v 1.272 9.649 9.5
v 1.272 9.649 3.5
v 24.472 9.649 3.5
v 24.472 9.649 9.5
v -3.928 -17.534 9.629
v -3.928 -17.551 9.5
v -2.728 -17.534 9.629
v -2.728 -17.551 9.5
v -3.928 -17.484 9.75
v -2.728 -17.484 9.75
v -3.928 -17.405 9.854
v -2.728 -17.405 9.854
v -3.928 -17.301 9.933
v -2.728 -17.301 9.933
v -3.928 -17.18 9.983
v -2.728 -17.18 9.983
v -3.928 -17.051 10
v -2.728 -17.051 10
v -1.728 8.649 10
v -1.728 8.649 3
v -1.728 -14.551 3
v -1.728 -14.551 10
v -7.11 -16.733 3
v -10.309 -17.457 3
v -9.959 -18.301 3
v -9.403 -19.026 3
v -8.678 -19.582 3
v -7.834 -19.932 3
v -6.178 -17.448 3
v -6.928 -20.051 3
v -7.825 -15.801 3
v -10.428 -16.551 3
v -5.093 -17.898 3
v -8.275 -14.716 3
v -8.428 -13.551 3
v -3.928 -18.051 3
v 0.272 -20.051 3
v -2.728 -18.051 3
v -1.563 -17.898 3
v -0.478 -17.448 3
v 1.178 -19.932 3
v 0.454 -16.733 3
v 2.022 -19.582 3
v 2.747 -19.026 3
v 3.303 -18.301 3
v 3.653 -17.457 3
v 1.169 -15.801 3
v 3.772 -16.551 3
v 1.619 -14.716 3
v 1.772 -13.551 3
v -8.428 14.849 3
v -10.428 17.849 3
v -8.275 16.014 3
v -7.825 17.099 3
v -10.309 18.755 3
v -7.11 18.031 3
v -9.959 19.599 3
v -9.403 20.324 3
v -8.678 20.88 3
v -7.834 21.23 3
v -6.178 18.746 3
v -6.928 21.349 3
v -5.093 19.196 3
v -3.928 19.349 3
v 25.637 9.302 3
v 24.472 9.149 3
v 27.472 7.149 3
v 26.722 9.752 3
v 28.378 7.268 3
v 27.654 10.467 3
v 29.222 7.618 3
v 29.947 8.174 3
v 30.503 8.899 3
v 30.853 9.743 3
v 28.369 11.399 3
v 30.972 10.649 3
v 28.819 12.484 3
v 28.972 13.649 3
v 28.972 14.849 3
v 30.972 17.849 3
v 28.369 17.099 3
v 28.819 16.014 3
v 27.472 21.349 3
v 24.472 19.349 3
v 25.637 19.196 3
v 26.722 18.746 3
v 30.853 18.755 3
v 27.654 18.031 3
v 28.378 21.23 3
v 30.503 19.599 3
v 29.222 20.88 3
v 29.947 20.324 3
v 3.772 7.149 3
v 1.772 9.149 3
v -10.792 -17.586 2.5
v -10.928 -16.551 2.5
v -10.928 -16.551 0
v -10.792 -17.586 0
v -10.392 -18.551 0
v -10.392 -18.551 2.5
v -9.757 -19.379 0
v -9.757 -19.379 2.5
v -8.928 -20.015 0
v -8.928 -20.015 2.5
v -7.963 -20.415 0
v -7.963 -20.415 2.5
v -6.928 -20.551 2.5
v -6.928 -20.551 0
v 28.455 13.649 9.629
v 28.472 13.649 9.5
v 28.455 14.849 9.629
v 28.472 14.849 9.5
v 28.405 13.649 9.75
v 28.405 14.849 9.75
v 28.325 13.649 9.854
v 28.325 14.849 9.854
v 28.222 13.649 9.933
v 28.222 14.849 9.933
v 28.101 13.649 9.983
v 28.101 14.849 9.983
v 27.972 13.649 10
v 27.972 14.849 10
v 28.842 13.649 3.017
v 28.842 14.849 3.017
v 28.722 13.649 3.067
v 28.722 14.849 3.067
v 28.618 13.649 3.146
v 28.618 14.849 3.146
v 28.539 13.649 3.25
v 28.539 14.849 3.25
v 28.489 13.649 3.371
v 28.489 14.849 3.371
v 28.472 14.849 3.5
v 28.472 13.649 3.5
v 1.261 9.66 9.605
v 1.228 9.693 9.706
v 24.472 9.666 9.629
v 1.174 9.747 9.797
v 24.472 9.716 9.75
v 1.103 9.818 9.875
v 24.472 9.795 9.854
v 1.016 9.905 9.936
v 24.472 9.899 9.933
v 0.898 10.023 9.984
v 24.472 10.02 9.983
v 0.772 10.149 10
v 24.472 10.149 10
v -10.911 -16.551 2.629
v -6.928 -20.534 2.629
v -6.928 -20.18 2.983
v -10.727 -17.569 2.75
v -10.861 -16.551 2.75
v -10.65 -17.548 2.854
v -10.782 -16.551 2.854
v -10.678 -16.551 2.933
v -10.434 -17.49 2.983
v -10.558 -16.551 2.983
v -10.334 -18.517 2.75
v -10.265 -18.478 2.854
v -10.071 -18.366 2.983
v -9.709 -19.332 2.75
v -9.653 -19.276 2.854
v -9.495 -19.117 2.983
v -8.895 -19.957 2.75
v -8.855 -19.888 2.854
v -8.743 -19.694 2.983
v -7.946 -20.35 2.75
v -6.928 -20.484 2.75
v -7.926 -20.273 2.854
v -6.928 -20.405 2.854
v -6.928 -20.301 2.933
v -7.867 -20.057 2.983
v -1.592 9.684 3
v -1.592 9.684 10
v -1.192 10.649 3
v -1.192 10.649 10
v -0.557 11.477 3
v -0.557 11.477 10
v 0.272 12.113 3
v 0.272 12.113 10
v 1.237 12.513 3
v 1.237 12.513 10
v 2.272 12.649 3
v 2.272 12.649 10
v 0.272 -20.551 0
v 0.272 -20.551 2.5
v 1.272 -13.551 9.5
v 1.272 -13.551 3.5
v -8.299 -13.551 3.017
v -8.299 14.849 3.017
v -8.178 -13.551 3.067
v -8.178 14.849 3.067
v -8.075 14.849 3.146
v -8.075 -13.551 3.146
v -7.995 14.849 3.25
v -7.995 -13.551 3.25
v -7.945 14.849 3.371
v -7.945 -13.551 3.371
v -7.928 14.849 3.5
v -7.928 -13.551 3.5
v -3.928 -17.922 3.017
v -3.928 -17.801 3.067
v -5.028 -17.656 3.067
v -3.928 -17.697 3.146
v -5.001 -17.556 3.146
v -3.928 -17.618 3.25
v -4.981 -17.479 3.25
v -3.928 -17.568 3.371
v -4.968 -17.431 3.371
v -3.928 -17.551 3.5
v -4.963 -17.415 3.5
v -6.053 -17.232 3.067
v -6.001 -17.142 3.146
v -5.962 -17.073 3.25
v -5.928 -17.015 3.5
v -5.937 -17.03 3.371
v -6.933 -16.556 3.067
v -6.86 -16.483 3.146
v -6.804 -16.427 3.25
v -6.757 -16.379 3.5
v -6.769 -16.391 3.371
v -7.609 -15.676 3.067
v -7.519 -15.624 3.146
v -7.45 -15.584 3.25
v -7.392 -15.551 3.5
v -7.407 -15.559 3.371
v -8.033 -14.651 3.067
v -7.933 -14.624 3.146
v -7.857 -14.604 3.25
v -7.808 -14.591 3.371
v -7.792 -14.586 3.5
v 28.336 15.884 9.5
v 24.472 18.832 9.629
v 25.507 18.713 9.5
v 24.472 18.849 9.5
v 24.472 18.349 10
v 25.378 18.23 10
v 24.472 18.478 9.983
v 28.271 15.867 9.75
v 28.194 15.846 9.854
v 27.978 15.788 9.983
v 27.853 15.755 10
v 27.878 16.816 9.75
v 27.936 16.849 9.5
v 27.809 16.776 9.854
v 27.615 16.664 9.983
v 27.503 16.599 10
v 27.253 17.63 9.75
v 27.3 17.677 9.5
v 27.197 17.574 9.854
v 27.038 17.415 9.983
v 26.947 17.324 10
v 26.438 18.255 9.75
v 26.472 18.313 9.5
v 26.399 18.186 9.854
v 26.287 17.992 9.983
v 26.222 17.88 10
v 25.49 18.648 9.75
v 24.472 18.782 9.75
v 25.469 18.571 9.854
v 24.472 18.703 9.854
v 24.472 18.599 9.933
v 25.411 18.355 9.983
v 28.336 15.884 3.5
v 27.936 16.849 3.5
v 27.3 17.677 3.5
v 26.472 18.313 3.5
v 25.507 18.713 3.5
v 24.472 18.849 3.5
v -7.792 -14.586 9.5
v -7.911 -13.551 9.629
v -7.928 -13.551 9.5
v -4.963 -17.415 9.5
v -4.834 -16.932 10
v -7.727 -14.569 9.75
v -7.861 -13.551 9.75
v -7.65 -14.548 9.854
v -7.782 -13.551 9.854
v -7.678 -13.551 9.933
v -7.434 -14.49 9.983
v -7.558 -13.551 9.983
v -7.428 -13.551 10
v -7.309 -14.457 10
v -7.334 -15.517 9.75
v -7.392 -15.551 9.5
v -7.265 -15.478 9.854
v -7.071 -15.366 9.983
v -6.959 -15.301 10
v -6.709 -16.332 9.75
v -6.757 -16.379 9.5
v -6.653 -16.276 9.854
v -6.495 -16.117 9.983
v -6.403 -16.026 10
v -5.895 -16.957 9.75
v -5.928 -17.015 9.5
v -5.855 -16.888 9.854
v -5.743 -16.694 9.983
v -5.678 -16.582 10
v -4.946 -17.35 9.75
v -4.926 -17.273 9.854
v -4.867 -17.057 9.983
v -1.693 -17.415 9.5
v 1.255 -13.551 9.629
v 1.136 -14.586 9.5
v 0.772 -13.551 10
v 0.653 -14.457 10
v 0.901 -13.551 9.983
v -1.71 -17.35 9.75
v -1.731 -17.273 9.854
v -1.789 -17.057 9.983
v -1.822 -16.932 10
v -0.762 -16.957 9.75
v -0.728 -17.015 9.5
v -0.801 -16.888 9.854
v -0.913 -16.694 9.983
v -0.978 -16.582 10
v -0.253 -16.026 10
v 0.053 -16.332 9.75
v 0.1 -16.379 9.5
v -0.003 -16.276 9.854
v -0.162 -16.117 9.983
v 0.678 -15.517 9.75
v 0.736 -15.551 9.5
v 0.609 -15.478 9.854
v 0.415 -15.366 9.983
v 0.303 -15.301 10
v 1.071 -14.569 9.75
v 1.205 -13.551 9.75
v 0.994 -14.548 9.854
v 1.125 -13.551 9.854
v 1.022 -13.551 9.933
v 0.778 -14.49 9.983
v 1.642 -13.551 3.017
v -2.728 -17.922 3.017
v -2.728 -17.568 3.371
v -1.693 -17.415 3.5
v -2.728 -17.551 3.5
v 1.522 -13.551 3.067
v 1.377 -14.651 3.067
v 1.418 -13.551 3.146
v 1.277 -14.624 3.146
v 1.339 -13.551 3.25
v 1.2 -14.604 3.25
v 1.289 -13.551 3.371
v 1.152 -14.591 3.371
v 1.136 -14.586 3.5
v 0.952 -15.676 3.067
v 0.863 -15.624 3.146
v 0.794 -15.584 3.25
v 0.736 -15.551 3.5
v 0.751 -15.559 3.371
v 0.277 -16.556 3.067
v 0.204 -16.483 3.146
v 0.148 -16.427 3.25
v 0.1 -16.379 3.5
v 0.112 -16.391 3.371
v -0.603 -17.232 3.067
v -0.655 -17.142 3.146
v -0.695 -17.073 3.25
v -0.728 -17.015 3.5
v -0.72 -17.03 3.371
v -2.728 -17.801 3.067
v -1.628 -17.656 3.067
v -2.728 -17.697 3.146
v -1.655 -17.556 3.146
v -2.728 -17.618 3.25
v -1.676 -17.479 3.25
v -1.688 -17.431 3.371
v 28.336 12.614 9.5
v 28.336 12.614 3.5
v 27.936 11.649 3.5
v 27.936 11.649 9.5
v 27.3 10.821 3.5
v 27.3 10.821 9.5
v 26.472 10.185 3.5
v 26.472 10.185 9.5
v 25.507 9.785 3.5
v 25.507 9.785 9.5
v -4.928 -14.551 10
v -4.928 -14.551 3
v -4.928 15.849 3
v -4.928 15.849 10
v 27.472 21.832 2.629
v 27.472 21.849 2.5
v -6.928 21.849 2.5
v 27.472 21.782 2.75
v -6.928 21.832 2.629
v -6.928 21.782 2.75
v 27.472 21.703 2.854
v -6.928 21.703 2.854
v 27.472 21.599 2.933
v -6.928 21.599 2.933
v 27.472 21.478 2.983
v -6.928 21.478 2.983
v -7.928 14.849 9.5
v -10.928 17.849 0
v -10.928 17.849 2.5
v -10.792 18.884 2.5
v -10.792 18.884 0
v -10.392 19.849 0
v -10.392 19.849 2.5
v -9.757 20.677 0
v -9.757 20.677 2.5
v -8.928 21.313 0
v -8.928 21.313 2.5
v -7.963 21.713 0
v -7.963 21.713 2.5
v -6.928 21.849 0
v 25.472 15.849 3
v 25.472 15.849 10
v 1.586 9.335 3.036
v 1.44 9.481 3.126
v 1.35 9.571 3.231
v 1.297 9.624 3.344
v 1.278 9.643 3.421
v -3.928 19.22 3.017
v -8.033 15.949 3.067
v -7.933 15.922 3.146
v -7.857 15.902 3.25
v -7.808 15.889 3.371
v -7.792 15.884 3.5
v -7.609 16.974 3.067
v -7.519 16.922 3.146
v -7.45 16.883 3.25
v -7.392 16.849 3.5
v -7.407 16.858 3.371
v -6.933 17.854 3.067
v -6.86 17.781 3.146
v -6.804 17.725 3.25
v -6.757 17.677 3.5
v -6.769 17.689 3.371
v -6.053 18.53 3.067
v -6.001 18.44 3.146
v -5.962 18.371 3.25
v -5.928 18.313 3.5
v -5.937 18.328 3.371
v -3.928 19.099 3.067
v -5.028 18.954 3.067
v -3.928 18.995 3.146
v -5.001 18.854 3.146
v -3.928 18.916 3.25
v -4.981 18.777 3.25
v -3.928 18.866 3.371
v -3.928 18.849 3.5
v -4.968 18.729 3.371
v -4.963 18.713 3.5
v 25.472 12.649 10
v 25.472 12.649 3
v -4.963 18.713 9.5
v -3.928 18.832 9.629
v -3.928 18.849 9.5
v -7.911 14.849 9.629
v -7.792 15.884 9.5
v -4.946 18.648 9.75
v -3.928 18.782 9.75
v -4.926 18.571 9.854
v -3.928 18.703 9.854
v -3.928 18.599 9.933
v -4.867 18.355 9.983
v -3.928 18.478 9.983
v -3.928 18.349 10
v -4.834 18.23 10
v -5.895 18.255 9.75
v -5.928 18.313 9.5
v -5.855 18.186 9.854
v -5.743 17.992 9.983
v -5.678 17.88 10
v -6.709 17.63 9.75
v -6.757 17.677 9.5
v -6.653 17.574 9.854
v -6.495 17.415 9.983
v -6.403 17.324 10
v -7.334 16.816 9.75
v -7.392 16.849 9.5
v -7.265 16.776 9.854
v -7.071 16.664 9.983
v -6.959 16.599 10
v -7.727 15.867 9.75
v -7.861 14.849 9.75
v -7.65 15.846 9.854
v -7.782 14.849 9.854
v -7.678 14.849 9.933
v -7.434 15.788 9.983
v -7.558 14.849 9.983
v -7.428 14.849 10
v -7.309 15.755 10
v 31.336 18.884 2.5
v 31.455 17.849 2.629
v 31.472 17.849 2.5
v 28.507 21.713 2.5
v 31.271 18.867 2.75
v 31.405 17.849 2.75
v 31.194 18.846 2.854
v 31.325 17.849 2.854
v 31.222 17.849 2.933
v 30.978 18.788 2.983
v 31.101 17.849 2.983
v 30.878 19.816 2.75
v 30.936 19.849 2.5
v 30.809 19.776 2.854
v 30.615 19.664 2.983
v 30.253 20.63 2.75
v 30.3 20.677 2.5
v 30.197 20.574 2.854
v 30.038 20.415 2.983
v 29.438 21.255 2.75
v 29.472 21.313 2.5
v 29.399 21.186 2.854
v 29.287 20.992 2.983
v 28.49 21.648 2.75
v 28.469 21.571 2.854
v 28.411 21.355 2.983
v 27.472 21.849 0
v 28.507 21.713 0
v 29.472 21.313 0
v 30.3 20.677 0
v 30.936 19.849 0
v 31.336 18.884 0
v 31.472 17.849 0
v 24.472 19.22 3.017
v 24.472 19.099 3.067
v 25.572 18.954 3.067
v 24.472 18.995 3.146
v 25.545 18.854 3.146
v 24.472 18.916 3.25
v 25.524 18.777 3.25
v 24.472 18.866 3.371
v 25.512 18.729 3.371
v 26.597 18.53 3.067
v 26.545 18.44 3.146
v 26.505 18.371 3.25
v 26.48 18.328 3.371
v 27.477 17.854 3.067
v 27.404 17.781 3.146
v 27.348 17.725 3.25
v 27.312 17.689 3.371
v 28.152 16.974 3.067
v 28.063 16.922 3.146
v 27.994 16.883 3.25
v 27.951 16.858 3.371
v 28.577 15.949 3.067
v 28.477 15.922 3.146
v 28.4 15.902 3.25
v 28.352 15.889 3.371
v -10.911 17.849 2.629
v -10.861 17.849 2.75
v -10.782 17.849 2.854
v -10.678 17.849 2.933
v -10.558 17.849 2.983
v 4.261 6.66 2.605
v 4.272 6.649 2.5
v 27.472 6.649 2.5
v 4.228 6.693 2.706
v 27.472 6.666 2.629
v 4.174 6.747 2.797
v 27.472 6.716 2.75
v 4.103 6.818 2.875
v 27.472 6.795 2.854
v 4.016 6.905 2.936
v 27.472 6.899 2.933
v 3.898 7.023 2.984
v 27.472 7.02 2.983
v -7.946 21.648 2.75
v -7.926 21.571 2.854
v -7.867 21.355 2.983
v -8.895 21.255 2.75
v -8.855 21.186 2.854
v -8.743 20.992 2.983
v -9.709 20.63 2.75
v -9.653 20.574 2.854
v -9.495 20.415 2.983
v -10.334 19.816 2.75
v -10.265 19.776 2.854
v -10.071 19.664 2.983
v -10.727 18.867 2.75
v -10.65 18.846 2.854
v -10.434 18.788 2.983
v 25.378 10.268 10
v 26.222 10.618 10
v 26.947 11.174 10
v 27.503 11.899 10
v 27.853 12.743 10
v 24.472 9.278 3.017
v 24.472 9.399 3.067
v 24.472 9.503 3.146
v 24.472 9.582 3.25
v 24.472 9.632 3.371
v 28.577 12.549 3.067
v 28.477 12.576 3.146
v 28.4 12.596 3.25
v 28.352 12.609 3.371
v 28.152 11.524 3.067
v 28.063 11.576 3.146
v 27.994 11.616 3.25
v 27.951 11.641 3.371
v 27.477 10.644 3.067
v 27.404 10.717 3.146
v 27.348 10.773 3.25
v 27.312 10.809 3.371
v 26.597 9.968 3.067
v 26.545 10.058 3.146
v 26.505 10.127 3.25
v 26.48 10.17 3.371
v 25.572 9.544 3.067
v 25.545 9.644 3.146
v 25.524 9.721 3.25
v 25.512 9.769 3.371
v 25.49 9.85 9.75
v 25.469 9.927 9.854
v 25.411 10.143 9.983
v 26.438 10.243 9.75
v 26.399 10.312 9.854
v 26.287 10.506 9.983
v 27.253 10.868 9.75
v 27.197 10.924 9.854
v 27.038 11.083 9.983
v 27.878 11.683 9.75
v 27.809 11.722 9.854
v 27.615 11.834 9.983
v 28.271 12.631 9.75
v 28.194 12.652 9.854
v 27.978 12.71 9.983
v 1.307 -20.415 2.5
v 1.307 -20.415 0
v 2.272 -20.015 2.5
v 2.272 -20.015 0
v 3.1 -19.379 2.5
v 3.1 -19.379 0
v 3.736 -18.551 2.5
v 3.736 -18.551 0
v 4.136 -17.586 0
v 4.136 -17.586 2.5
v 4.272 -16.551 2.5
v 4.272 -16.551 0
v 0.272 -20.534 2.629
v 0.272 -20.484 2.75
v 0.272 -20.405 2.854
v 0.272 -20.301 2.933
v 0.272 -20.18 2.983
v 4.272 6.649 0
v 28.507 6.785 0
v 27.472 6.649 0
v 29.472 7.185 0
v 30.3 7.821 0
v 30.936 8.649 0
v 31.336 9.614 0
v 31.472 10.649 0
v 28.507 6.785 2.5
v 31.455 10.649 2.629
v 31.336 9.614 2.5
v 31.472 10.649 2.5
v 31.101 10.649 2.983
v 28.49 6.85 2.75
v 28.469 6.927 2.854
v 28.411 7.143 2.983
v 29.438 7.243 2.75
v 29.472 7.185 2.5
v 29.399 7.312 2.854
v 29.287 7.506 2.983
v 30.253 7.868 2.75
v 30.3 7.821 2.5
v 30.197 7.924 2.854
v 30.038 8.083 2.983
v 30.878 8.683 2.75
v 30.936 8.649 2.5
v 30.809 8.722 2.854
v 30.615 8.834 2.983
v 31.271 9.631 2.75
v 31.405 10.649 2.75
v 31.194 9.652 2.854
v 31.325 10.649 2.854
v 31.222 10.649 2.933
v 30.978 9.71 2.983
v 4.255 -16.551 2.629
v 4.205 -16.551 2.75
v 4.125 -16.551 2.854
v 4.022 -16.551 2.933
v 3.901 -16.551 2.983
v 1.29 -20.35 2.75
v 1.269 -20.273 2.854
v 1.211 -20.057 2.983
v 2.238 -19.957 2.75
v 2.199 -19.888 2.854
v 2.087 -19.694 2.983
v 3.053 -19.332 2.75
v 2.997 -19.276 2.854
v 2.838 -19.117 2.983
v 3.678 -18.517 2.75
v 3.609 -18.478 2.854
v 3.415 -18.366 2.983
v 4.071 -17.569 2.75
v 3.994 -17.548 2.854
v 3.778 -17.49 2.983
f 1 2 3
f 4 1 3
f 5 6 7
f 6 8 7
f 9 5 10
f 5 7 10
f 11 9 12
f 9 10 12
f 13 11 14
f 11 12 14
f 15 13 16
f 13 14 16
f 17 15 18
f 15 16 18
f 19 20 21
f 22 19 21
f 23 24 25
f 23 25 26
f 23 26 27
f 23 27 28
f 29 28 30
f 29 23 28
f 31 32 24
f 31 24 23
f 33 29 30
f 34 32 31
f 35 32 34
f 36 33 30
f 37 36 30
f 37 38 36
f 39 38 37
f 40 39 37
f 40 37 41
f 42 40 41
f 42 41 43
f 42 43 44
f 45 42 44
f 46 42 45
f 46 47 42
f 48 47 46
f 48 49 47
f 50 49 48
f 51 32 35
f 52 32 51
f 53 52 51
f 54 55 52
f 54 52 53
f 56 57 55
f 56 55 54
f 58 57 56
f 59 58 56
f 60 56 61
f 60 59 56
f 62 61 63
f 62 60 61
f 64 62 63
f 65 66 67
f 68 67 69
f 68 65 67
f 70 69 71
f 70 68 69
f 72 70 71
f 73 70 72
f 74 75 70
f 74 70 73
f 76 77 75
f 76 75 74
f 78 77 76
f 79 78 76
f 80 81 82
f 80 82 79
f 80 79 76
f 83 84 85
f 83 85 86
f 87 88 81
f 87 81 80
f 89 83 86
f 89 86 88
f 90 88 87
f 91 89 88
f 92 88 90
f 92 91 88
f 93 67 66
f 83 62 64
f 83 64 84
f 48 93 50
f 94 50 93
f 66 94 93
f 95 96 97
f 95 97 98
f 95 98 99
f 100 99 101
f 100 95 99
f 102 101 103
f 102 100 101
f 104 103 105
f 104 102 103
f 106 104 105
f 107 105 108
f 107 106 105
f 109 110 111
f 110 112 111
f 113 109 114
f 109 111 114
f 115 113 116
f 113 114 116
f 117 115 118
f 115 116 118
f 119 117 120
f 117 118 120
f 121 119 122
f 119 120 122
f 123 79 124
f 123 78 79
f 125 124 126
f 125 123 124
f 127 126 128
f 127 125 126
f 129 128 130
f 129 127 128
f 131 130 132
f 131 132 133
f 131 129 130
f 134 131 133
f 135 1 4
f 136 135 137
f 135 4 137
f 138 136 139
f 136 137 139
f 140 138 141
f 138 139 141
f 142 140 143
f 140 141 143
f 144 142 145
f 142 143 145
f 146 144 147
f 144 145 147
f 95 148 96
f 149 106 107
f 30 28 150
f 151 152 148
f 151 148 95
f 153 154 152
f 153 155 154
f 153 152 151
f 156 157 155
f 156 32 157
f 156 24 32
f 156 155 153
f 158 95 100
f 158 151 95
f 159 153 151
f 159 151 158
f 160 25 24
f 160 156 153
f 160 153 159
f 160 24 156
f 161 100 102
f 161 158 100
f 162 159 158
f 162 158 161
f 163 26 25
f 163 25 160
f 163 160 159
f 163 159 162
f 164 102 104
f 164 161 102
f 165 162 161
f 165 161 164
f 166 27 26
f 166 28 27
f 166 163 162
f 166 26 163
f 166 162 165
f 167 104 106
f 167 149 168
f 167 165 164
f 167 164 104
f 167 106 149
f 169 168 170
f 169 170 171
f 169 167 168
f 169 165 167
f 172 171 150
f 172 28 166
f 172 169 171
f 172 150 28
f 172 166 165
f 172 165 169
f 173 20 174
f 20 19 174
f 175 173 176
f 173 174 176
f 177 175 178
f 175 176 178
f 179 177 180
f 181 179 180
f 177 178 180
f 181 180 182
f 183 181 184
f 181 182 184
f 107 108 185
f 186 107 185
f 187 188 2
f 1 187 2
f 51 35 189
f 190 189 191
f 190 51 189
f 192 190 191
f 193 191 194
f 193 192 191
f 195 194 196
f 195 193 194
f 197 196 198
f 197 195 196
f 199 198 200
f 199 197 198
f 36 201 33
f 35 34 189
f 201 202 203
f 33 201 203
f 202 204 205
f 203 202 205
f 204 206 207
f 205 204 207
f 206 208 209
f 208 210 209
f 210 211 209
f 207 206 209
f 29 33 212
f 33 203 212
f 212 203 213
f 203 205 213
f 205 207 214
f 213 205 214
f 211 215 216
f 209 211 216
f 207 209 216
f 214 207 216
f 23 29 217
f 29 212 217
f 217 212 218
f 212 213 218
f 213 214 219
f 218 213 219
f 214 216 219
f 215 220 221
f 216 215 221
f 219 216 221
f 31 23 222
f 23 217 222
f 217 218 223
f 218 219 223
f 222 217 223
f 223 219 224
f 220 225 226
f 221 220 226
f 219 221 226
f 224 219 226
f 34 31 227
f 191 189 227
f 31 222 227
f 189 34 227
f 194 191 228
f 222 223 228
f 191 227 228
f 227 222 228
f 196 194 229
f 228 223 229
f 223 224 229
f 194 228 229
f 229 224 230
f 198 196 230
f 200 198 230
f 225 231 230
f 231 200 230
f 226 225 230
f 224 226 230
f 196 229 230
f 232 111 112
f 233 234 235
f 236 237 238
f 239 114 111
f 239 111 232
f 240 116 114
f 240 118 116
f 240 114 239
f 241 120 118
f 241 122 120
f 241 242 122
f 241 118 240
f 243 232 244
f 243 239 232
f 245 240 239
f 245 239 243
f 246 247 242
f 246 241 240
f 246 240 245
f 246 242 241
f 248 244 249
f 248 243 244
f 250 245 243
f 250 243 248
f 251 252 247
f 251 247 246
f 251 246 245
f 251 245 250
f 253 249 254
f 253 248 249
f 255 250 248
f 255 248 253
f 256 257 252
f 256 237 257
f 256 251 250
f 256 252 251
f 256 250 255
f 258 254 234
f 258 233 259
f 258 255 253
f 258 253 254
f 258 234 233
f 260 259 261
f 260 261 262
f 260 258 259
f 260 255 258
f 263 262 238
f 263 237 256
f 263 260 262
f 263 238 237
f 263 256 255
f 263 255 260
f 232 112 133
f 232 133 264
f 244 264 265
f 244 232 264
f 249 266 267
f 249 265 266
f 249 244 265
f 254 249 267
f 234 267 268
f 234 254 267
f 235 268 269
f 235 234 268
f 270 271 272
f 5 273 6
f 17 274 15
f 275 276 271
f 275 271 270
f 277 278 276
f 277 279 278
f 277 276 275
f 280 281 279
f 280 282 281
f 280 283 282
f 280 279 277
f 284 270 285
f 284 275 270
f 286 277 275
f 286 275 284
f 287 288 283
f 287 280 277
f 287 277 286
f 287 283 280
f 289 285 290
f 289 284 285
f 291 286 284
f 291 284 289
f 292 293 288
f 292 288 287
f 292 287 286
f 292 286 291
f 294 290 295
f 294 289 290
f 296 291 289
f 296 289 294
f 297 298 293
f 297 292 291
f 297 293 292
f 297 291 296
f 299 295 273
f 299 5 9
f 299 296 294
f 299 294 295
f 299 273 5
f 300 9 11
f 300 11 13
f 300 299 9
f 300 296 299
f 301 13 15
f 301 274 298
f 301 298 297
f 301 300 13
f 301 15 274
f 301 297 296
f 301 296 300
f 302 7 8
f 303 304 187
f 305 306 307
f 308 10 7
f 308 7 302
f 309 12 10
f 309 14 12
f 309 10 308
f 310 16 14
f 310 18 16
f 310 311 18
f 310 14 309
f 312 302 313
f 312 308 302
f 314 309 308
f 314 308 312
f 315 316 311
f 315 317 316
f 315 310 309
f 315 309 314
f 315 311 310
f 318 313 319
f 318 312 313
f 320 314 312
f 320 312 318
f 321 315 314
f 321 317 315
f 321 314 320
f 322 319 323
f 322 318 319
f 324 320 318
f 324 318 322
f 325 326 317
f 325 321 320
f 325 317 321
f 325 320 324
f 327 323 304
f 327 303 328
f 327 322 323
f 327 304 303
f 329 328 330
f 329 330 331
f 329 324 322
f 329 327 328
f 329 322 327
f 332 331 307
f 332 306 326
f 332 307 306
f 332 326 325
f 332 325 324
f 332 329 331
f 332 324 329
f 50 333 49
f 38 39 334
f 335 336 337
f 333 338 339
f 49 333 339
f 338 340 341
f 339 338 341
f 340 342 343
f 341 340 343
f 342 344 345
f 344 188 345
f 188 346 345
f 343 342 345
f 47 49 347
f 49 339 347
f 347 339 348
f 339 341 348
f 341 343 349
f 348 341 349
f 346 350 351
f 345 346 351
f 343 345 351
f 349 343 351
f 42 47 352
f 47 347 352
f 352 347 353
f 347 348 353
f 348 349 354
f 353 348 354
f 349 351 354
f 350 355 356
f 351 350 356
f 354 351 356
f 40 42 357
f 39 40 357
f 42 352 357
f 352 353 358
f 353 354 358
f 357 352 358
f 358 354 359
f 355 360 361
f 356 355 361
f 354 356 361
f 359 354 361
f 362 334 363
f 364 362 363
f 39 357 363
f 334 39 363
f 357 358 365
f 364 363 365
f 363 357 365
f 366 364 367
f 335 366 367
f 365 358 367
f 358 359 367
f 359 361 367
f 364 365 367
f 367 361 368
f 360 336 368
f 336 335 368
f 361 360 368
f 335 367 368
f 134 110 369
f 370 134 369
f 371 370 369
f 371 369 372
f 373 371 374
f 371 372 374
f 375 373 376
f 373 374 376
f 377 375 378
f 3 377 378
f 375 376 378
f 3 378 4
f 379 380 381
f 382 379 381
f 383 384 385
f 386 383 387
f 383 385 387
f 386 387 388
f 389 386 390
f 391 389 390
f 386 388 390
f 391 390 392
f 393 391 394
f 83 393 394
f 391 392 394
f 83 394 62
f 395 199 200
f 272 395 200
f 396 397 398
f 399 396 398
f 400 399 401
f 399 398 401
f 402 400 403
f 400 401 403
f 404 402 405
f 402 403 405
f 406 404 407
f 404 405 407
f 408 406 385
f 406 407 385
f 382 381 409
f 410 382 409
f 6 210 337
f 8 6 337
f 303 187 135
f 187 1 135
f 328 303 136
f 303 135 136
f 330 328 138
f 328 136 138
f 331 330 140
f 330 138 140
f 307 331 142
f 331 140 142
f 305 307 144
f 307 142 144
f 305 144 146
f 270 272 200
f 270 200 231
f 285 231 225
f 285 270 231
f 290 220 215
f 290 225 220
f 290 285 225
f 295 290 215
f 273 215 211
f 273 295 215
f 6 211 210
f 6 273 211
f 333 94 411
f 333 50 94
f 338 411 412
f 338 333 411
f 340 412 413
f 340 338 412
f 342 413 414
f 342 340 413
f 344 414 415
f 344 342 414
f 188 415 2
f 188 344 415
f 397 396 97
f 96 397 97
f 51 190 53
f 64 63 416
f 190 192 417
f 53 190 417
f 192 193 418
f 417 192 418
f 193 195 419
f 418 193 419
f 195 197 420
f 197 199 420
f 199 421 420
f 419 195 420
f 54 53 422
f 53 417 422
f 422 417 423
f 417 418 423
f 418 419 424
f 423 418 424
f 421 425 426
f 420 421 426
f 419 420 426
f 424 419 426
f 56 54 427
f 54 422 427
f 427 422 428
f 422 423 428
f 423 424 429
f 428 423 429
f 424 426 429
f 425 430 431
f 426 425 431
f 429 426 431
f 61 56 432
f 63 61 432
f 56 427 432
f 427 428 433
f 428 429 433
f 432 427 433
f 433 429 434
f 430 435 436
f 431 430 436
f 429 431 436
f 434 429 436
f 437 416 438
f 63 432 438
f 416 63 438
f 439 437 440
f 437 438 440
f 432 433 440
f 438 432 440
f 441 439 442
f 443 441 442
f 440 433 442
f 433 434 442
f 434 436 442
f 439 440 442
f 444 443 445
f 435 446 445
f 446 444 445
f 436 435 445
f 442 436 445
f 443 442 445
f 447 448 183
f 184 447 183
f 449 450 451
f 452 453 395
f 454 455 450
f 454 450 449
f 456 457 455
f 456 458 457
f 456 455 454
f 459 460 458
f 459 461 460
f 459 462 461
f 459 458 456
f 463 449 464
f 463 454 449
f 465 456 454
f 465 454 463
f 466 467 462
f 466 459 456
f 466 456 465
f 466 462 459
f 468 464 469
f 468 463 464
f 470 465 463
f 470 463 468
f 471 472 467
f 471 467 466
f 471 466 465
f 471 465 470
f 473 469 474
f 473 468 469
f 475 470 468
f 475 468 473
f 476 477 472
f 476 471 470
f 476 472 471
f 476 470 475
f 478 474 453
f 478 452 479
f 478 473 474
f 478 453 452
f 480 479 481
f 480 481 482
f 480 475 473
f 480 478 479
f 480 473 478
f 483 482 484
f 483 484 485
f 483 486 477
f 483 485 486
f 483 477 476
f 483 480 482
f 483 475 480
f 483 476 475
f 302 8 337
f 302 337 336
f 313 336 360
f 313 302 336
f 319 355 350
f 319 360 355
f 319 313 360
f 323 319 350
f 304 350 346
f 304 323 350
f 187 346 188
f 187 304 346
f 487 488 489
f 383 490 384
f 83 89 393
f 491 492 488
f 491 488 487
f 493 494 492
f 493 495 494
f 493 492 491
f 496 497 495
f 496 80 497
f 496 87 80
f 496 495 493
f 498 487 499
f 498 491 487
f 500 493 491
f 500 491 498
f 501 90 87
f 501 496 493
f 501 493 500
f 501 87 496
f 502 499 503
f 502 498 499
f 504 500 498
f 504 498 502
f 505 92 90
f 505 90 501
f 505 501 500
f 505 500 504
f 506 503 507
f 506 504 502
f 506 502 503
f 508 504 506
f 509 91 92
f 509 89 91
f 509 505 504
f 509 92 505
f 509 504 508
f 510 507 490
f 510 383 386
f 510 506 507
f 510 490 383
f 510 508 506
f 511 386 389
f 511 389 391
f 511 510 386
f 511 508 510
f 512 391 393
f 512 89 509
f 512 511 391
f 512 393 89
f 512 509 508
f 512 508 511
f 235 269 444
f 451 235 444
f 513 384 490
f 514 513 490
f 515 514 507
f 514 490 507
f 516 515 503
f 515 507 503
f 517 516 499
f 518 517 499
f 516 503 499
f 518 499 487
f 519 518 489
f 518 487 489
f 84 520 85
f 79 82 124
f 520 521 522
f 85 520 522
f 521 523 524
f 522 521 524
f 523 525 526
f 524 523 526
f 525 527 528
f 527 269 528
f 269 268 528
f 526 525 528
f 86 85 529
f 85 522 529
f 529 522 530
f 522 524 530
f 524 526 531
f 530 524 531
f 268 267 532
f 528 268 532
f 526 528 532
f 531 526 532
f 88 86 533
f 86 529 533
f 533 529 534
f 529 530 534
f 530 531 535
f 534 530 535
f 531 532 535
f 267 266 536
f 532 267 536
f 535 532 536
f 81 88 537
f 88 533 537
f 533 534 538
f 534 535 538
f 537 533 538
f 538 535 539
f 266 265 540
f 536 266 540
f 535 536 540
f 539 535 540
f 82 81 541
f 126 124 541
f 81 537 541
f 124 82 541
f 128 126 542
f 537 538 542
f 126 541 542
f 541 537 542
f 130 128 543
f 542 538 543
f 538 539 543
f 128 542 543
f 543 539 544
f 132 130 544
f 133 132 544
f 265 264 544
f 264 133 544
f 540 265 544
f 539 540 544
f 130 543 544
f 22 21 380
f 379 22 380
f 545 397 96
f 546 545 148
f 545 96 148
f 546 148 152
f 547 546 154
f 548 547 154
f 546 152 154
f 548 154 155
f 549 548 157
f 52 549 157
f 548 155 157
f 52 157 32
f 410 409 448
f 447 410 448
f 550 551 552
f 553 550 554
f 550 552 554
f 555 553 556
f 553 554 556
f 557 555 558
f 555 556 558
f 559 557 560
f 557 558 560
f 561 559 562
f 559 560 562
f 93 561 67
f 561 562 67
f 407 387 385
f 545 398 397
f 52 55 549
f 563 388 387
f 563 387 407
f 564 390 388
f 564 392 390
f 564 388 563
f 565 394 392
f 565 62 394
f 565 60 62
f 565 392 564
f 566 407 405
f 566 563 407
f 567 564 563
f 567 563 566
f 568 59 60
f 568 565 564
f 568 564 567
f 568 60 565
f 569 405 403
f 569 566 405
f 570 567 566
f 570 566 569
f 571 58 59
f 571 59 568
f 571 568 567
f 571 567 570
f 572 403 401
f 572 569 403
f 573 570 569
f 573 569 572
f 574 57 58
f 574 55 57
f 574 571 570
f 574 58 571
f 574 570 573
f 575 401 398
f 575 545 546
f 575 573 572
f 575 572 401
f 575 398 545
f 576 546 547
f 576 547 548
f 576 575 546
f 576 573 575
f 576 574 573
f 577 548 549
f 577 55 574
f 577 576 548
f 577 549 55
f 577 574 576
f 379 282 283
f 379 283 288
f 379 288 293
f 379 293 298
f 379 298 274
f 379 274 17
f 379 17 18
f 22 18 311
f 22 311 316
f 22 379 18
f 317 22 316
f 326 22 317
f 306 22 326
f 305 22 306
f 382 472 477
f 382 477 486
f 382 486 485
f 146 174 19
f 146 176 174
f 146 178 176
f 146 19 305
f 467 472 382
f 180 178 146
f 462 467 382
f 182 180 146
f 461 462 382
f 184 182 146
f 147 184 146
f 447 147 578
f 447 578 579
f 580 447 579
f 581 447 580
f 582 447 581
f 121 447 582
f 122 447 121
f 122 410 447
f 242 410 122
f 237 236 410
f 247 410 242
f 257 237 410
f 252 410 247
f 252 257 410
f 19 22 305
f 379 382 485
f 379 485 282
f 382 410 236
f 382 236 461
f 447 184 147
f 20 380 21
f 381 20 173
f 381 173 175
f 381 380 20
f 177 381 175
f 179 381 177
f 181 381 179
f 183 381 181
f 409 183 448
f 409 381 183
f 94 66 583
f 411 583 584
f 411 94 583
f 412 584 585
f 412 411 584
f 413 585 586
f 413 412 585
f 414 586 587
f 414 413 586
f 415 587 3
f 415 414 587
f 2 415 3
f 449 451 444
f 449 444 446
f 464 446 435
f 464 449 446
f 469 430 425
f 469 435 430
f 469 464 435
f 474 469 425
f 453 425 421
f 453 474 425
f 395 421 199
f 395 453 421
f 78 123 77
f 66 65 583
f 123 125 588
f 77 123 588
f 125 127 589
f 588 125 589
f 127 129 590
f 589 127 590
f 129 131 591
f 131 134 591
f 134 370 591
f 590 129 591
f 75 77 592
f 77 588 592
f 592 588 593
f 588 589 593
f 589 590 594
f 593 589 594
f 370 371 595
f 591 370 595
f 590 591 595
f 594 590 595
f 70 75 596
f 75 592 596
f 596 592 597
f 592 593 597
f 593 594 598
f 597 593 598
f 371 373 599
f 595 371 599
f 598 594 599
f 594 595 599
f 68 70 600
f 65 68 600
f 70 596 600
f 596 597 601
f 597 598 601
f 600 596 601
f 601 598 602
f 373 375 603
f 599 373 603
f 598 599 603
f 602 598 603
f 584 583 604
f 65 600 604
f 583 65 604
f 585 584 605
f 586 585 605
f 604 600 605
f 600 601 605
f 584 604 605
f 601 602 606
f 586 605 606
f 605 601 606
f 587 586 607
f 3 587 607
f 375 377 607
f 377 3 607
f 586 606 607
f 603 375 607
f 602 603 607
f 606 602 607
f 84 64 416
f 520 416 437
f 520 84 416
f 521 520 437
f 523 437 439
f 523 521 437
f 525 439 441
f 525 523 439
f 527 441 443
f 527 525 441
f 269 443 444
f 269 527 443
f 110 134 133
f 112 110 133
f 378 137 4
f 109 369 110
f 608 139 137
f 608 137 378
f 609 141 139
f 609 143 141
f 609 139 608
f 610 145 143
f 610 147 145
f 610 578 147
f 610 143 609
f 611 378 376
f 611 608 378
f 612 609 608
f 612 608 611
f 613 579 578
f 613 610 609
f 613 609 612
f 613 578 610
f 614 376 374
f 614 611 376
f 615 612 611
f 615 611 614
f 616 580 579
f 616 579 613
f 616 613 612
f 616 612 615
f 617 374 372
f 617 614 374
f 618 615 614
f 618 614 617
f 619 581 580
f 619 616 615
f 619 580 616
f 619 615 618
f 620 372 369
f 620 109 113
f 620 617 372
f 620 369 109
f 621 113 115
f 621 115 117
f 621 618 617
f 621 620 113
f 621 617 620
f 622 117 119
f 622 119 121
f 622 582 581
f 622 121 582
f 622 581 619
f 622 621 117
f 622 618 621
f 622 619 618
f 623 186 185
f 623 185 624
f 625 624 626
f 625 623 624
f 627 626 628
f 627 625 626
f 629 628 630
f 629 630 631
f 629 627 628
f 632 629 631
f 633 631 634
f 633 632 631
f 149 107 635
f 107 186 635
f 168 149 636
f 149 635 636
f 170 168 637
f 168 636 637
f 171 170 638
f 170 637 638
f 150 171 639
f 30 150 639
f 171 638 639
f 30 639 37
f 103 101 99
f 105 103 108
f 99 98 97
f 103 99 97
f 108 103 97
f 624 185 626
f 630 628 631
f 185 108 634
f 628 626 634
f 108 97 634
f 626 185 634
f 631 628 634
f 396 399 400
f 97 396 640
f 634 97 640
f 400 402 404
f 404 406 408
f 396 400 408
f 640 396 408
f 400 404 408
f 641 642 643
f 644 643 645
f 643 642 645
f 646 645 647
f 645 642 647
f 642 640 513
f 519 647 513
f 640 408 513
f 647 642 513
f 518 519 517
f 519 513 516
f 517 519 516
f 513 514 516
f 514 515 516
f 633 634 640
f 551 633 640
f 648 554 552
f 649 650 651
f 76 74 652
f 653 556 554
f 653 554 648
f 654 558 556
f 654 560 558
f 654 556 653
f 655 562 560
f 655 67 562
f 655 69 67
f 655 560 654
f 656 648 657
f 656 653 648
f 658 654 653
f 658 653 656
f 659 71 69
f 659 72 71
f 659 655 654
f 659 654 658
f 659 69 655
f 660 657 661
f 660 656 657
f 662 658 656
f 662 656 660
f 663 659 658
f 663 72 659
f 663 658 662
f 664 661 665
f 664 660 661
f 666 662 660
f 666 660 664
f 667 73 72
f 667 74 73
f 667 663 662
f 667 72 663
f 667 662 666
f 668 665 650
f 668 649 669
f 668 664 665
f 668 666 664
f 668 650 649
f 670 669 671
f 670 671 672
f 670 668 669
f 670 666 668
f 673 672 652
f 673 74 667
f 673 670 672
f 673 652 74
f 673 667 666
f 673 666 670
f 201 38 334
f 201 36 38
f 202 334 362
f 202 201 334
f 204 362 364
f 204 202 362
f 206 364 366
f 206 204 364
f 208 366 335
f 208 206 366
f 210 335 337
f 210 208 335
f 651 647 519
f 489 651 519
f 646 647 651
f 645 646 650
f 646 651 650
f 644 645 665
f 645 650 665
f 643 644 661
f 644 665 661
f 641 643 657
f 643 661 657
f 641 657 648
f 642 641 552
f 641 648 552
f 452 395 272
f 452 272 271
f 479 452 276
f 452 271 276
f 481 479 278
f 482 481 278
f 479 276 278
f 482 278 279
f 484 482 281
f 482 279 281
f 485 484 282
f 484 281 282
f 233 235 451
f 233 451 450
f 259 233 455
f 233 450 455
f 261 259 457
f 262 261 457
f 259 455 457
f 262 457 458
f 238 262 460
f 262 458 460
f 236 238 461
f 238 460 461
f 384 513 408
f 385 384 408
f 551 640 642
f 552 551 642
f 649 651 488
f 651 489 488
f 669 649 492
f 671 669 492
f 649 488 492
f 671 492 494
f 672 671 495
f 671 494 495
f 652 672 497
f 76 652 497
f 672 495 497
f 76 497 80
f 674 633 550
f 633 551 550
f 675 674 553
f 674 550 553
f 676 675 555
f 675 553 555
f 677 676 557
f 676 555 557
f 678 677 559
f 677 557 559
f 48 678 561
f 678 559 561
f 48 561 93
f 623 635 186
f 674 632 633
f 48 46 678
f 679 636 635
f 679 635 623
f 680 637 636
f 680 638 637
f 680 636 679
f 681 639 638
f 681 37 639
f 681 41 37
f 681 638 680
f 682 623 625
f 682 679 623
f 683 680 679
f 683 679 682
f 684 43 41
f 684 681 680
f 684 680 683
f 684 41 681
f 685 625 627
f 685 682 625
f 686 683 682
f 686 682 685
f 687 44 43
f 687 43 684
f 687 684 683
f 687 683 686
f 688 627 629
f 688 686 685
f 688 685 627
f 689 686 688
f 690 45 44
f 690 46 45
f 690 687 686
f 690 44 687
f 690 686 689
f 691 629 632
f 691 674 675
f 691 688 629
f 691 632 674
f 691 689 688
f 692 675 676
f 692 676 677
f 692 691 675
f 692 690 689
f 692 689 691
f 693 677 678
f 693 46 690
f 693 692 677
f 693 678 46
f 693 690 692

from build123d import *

# Parameters (mm, degrees)
F1_DEPTH = 3
F2_DEPTH = 10
F3_R     = 4
F4_R     = 0.5


with BuildPart() as f1:
    # F0 (on Top) → F1 (new body)
    with BuildSketch(Plane.XY):
        Polygon((-10.9281279506, 21.8490213156), (-10.9281279506, -20.5509786844), (4.2718720494, -20.5509786844), (4.2718720494, 6.6490213156), (31.4718720494, 6.6490213156), (31.4718720494, 21.8490213156), align=None)
        Polygon((28.4718720494, 18.8490213156), (28.4718720494, 9.6490213156), (1.2718720494, 9.6490213156), (1.2718720494, -17.5509786844), (-7.9281279506, -17.5509786844), (-7.9281279506, 18.8490213156), align=None, mode=Mode.SUBTRACT)
        Polygon((1.2718720494, 9.6490213156), (28.4718720494, 9.6490213156), (28.4718720494, 18.8490213156), (-7.9281279506, 18.8490213156), (-7.9281279506, -17.5509786844), (1.2718720494, -17.5509786844), align=None)
        Polygon((-1.7281279506, -14.5509786844), (-4.9281279506, -14.5509786844), (-4.9281279506, 15.8490213156), (25.4718720494, 15.8490213156), (25.4718720494, 12.6490213156), (-1.7281279506, 12.6490213156), align=None, mode=Mode.SUBTRACT)
        Polygon((-4.9281279506, 15.8490213156), (-4.9281279506, -14.5509786844), (-1.7281279506, -14.5509786844), (-1.7281279506, 12.6490213156), (25.4718720494, 12.6490213156), (25.4718720494, 15.8490213156), align=None)
    extrude(amount=F1_DEPTH)

    # F0 (on Top) → F2 (join)
    with BuildSketch(Plane.XY):
        Polygon((1.2718720494, 9.6490213156), (28.4718720494, 9.6490213156), (28.4718720494, 18.8490213156), (-7.9281279506, 18.8490213156), (-7.9281279506, -17.5509786844), (1.2718720494, -17.5509786844), align=None)
        Polygon((-1.7281279506, -14.5509786844), (-4.9281279506, -14.5509786844), (-4.9281279506, 15.8490213156), (25.4718720494, 15.8490213156), (25.4718720494, 12.6490213156), (-1.7281279506, 12.6490213156), align=None, mode=Mode.SUBTRACT)
    extrude(amount=F2_DEPTH)

    # F3
    f3_edges = [f1.edges().sort_by_distance(p)[0] for p in [
        (4.271872, -20.550979, 1.5),
        (31.471872, 6.649021, 1.5),
        (31.471872, 21.849021, 1.5),
        (-10.928128, 21.849021, 1.5),
        (-10.928128, -20.550979, 1.5),
        (1.271872, -17.550979, 6.5),
        (28.471872, 9.649021, 6.5),
        (28.471872, 18.849021, 6.5),
        (-7.928128, -17.550979, 6.5),
        (-1.728128, 12.649021, 6.5),
        (-7.928128, 18.849021, 6.5),
    ]]
    fillet(f3_edges, radius=F3_R)

    # F4
    f4_edges = [f1.edges().sort_by_distance(p)[0] for p in [
        (-10.928128, 0.649021, 3),
        (-9.756555, 20.677448, 3),
        (-9.756555, -19.379406, 3),
        (10.271872, 21.849021, 3),
        (-3.328128, -20.550979, 3),
        (30.300299, 20.677448, 3),
        (3.100299, -19.379406, 3),
        (31.471872, 14.249021, 3),
        (4.271872, -4.950979, 3),
        (30.300299, 7.820594, 3),
        (15.871872, 6.649021, 3),
        (1.271872, -1.950979, 3),
        (0.100299, -16.379406, 3),
        (12.871872, 9.649021, 3),
        (-3.328128, -17.550979, 3),
        (27.300299, 10.820594, 3),
        (-6.756555, -16.379406, 3),
        (28.471872, 14.249021, 3),
        (-7.928128, 0.649021, 3),
        (27.300299, 17.677448, 3),
        (-6.756555, 17.677448, 3),
        (10.271872, 18.849021, 3),
        (-7.928128, 0.649021, 10),
        (-6.756555, 17.677448, 10),
        (10.271872, 18.849021, 10),
        (27.300299, 17.677448, 10),
    ]]
    fillet(f4_edges, radius=F4_R)


solid = f1.part
